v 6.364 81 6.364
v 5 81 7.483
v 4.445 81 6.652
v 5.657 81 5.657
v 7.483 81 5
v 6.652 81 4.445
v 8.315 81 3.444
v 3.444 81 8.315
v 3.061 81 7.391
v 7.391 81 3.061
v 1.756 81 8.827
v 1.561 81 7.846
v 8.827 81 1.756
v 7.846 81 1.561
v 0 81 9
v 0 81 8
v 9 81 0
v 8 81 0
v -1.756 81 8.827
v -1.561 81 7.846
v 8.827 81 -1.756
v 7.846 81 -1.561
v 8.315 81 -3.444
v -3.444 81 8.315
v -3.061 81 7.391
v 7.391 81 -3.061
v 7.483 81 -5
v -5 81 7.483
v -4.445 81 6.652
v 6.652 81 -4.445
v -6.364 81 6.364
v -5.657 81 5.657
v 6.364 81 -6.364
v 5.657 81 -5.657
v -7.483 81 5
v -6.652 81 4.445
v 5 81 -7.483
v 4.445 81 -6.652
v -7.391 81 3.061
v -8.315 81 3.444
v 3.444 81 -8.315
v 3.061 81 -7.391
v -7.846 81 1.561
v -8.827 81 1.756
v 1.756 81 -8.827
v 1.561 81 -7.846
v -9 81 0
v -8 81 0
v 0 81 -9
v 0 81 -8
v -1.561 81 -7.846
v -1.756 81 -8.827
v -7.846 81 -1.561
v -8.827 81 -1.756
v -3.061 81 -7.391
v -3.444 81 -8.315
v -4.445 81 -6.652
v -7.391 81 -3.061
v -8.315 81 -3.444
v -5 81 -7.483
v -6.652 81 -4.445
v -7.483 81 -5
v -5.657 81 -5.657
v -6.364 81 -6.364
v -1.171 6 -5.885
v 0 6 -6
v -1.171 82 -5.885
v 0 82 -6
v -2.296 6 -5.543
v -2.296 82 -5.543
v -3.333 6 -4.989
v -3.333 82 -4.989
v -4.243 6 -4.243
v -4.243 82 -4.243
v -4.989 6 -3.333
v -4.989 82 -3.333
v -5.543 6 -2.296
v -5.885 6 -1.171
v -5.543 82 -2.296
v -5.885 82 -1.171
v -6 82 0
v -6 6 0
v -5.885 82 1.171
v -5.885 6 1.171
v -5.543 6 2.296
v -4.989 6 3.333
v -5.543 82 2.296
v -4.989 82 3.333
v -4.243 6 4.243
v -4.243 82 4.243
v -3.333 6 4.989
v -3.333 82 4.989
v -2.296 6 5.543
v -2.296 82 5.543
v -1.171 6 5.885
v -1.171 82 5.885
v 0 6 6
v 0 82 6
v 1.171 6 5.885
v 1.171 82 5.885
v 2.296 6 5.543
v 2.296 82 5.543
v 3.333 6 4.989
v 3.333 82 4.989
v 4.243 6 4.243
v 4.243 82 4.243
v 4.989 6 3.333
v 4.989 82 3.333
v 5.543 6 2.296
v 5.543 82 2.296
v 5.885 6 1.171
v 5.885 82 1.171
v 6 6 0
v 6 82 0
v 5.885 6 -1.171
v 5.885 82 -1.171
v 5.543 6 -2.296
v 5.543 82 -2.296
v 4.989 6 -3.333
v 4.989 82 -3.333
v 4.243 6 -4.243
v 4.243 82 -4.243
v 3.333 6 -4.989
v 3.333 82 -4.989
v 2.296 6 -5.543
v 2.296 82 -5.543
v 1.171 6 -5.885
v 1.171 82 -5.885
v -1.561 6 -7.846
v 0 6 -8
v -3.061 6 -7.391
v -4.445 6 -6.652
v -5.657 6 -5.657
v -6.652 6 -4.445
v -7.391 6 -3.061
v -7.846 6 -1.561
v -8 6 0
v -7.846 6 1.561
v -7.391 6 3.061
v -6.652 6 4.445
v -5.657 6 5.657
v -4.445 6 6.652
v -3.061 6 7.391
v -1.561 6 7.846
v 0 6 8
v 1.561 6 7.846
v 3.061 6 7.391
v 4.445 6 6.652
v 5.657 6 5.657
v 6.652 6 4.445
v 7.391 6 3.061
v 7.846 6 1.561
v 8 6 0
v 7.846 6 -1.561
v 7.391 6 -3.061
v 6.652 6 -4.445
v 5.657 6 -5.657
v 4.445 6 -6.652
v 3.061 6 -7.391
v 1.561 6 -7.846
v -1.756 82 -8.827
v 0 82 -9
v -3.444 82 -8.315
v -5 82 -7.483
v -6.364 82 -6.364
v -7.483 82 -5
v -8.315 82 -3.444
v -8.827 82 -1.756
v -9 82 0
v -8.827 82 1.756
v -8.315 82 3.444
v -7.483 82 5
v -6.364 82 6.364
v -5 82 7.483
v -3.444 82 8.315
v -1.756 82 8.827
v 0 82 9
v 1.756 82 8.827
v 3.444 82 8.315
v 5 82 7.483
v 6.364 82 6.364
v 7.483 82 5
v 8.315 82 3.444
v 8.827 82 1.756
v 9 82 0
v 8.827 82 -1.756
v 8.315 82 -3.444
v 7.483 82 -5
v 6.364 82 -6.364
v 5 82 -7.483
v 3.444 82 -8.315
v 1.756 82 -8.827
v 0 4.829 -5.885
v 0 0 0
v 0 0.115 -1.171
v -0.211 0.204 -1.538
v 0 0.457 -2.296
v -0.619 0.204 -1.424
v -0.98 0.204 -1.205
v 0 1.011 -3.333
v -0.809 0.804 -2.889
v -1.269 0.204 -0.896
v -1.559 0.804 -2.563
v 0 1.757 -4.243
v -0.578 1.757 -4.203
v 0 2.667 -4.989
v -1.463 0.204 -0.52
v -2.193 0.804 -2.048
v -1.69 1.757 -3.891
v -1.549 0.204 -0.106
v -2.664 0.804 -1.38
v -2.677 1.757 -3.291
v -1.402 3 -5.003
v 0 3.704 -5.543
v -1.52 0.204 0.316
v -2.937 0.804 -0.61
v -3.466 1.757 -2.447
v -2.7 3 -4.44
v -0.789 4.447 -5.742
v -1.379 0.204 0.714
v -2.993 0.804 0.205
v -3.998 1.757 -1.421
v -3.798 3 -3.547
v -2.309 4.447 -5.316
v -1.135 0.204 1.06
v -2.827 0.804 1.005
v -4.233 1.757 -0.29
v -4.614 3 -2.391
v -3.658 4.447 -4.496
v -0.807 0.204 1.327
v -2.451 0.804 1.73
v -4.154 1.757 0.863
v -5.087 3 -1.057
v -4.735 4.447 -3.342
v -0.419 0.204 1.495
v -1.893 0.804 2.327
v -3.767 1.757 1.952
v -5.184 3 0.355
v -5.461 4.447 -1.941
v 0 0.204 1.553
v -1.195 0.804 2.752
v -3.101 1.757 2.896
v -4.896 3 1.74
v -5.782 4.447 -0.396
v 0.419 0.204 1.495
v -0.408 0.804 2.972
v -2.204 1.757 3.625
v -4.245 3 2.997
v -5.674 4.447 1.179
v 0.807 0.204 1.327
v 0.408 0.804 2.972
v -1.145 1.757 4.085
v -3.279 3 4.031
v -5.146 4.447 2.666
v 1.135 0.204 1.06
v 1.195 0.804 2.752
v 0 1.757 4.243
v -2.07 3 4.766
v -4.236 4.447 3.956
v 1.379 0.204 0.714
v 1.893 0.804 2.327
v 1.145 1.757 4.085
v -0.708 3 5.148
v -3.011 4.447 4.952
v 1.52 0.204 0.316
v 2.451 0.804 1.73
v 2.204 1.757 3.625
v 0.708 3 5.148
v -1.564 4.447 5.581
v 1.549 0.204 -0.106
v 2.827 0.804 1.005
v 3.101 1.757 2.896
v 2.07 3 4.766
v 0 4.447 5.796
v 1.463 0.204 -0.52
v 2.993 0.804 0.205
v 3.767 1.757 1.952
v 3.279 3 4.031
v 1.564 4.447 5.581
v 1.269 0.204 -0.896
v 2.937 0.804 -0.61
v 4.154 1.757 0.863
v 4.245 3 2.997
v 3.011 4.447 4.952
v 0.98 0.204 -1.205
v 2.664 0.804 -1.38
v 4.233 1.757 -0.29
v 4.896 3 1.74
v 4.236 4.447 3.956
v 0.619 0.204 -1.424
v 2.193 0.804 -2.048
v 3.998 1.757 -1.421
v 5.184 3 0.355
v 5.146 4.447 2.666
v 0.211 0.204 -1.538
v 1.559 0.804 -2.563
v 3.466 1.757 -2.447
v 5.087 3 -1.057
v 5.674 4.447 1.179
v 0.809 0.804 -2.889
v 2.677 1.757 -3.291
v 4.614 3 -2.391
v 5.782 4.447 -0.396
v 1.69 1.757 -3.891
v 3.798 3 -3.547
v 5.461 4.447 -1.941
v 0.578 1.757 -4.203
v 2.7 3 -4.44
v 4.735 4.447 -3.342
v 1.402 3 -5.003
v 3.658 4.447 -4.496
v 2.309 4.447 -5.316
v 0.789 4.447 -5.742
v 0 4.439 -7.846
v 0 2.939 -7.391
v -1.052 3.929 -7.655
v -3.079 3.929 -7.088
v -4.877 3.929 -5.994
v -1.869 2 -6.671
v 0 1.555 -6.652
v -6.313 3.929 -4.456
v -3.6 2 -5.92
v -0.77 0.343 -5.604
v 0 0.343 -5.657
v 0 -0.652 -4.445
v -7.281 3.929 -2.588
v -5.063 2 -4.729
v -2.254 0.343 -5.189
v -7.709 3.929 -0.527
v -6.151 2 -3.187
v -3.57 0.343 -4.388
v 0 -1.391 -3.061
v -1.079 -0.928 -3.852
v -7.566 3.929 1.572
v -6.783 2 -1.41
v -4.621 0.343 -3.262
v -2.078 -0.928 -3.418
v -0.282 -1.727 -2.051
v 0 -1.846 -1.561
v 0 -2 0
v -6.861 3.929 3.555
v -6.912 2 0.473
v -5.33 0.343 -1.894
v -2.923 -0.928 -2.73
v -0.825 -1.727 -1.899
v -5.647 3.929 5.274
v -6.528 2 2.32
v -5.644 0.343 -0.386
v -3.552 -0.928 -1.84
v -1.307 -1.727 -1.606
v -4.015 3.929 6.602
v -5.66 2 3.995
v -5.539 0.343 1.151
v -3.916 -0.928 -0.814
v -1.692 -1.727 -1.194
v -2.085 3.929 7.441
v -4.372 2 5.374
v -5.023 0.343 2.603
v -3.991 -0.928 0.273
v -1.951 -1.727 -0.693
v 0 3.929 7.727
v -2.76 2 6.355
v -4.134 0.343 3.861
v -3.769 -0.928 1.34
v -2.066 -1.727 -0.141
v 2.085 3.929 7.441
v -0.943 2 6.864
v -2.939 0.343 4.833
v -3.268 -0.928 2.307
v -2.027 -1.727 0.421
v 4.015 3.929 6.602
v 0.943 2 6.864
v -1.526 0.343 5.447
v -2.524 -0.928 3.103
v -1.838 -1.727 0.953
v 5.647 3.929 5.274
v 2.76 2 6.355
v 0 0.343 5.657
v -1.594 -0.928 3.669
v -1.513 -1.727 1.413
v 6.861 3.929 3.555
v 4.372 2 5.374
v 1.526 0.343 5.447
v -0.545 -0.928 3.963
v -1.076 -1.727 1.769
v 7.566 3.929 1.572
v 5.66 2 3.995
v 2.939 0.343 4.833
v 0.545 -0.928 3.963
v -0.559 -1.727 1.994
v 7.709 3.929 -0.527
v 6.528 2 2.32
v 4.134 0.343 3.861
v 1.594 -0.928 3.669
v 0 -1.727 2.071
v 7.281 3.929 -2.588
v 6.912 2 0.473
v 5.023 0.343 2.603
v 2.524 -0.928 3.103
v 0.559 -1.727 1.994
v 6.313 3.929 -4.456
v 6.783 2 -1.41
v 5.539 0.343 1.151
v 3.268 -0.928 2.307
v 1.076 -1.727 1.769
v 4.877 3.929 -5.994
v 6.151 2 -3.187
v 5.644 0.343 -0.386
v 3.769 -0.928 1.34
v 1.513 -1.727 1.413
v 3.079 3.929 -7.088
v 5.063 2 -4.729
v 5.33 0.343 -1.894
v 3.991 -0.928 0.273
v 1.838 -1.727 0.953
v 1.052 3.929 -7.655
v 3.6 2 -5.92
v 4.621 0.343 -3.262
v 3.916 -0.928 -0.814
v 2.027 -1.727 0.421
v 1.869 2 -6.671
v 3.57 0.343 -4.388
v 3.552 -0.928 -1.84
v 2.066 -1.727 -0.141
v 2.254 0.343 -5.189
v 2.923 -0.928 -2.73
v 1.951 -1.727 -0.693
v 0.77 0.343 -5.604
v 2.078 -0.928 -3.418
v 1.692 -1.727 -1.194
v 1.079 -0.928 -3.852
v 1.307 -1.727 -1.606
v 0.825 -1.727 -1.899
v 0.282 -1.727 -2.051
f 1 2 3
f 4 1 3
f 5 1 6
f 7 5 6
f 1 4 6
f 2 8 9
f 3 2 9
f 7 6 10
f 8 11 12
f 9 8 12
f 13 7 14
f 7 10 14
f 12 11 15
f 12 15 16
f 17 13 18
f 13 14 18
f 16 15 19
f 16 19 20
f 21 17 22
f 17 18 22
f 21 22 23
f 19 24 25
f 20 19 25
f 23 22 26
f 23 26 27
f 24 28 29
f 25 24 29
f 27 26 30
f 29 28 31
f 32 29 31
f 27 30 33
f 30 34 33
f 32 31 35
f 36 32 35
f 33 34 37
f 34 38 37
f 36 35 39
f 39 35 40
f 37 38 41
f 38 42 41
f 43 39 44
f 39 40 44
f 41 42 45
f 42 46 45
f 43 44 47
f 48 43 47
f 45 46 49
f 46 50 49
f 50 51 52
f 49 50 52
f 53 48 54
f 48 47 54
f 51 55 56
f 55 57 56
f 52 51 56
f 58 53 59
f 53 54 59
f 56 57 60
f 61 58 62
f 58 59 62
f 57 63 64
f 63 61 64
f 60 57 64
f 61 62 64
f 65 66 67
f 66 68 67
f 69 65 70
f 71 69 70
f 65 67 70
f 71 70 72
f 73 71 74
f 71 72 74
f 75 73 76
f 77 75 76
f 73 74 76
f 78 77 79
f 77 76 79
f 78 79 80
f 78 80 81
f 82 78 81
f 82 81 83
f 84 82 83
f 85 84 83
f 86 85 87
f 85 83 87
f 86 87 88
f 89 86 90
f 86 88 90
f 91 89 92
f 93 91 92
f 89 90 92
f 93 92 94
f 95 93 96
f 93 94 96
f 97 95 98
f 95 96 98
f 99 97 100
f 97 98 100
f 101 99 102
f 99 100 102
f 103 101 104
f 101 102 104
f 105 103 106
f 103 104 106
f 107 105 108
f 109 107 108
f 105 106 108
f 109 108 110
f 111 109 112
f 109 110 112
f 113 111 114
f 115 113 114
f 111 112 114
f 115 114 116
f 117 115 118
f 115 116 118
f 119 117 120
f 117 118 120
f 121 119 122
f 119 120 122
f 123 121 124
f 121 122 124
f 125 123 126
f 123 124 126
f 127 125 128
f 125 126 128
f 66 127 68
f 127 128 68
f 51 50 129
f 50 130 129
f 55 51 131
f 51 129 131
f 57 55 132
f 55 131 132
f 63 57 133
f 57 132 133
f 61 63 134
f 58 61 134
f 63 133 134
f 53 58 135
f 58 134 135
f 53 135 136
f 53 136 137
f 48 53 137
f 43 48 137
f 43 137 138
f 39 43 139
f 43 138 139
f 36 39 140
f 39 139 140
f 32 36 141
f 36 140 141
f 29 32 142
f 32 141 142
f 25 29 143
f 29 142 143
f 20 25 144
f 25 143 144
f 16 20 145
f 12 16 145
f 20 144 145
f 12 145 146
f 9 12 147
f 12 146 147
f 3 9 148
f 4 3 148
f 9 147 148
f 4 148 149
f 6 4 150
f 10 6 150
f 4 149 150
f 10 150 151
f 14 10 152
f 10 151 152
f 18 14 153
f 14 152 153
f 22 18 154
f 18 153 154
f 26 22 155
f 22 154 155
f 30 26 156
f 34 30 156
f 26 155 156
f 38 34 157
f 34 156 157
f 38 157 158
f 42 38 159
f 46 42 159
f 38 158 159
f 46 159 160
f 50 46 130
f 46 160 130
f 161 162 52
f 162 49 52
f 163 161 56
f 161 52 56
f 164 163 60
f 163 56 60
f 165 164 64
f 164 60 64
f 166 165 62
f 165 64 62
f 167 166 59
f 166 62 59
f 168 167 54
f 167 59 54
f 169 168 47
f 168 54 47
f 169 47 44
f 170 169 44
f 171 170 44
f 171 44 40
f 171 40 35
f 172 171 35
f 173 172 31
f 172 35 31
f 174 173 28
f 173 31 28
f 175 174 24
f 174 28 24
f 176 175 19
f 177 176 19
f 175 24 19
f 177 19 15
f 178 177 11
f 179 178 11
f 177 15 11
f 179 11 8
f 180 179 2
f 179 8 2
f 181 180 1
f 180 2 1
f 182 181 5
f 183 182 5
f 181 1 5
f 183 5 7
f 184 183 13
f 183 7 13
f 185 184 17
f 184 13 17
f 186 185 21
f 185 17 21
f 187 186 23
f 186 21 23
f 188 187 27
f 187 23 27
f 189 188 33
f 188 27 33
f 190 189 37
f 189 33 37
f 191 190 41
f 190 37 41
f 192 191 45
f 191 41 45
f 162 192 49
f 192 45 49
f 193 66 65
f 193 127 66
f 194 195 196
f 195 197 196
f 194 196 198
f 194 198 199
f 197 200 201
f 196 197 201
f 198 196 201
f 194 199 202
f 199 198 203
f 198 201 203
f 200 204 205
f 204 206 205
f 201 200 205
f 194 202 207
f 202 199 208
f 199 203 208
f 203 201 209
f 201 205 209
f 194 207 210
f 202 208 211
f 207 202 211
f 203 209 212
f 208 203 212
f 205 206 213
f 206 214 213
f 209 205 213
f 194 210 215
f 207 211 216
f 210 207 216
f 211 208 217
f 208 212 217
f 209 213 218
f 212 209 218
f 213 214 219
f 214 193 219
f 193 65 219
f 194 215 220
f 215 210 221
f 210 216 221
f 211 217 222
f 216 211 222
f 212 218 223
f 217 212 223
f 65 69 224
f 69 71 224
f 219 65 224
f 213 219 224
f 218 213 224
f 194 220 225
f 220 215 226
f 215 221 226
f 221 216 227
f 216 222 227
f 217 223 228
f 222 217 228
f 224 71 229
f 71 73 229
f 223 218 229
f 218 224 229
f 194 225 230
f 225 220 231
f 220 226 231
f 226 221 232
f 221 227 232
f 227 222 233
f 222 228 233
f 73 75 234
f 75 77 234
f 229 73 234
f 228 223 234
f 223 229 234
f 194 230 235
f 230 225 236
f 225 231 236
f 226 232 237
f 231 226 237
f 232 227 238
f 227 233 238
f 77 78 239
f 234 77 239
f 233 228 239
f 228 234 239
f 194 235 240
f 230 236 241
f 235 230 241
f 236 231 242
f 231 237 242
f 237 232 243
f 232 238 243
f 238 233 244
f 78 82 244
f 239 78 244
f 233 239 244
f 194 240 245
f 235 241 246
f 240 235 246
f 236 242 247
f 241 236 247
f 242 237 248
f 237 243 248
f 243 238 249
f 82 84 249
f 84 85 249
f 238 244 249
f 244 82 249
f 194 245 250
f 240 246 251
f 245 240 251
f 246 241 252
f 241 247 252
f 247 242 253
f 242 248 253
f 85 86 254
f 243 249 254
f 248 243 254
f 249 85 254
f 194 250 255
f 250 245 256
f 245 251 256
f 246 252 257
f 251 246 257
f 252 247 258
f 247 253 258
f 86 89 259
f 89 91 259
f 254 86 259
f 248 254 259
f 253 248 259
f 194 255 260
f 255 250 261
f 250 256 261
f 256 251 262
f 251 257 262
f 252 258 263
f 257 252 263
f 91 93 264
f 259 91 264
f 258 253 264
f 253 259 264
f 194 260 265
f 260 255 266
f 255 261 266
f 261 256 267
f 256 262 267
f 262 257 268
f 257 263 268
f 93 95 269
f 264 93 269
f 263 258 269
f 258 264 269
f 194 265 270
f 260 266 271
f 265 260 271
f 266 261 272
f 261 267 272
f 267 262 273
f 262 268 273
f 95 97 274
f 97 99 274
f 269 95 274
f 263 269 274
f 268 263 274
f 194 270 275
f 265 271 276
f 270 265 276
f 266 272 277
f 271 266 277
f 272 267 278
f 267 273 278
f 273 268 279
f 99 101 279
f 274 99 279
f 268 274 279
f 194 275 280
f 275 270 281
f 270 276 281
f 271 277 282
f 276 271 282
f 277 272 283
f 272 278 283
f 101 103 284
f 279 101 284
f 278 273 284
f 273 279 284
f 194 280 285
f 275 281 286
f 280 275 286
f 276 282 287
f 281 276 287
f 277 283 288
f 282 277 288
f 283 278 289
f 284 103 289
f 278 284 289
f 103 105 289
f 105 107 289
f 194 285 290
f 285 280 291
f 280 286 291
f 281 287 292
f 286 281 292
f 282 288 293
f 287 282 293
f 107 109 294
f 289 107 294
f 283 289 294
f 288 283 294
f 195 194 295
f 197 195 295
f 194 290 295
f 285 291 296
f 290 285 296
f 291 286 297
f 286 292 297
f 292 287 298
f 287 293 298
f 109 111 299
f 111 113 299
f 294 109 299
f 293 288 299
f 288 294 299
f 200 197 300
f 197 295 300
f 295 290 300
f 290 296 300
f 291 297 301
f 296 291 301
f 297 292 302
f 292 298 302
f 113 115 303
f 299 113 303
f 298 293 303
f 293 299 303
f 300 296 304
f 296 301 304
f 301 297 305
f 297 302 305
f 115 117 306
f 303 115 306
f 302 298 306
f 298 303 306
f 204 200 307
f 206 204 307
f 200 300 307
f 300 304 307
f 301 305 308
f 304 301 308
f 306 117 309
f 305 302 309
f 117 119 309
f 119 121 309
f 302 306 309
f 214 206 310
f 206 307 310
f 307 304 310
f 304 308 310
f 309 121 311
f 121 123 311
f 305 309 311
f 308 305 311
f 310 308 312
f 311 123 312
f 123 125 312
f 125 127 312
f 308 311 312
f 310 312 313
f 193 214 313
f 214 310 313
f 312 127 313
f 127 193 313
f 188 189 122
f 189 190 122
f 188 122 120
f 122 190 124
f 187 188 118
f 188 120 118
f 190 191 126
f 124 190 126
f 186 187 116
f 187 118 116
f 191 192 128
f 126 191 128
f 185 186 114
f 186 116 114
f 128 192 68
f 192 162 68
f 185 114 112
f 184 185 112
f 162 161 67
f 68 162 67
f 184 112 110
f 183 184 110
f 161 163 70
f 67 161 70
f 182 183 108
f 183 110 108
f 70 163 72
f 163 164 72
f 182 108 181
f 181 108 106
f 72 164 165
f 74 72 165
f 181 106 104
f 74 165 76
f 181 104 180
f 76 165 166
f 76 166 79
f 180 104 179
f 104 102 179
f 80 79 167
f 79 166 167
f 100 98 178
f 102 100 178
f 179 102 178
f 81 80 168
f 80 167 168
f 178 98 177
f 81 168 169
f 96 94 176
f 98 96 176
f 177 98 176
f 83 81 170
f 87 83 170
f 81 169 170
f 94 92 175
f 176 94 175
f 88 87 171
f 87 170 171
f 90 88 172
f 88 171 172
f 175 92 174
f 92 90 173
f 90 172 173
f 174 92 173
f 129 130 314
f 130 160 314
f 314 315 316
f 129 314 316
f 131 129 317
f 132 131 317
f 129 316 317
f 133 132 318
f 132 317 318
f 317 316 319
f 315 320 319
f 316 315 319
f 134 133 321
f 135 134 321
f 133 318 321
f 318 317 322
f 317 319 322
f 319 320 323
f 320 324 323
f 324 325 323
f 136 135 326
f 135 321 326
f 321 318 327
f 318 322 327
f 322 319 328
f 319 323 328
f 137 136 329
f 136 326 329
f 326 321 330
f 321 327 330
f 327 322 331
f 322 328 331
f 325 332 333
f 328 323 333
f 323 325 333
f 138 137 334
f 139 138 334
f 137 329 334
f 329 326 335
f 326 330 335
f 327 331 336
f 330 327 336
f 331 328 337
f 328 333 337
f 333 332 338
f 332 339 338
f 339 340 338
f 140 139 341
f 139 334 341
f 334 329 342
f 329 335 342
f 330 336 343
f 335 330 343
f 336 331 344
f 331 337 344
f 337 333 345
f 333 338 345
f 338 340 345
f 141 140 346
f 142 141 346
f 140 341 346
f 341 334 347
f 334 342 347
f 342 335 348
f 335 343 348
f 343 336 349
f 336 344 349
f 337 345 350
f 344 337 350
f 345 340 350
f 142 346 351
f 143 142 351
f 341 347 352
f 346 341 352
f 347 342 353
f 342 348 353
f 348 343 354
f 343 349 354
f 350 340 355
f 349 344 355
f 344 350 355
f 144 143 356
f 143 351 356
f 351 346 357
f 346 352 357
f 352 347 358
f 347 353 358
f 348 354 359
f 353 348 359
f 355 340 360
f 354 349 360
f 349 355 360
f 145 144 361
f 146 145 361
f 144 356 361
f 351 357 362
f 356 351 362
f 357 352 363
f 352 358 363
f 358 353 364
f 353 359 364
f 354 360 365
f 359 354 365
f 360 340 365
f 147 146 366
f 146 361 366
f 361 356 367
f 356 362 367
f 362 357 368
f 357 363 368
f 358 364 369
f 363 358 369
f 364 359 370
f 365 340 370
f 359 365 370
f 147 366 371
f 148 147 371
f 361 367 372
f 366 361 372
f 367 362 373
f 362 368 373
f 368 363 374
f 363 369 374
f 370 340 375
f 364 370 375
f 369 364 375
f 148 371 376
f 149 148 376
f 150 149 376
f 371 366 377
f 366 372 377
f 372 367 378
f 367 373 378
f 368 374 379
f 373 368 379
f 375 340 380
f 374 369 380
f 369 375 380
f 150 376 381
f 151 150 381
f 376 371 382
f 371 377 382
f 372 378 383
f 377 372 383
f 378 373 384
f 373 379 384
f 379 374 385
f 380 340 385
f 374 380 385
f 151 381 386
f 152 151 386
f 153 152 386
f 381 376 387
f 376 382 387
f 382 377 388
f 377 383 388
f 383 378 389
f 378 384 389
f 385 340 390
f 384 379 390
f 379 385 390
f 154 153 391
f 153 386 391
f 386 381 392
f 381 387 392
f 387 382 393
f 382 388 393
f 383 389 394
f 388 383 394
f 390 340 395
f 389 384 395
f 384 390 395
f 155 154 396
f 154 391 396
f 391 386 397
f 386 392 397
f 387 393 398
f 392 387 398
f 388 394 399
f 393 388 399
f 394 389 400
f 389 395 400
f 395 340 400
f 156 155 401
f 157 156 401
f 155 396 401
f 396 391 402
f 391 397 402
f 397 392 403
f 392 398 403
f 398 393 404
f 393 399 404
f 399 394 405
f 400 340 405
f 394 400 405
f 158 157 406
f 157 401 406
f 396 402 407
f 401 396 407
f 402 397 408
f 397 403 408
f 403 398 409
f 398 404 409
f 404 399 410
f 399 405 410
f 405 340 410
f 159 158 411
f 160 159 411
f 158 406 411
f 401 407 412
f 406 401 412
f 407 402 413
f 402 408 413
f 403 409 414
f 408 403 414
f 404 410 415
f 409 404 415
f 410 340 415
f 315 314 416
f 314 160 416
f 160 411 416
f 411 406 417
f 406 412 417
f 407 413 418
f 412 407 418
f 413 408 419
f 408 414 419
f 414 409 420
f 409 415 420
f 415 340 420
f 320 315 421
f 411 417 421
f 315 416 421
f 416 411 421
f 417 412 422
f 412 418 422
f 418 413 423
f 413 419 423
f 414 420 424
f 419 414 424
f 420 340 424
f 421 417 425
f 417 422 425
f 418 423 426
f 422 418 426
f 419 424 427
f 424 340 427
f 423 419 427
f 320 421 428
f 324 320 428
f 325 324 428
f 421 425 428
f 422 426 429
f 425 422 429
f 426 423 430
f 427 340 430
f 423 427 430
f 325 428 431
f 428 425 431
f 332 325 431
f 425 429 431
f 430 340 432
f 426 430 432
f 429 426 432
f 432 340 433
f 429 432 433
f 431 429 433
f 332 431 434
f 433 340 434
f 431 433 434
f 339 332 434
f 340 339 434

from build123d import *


with BuildPart() as part:
    # Sketch2 → Revolve1 (revolve)
    with BuildSketch(Plane.XY, mode=Mode.PRIVATE) as revolve1_sk:
        with BuildLine():
            Line((-6, 6), (-6, 81))
            Line((-6, 81), (-6, 82))
            Line((-6, 82), (-9, 82))
            Line((-9, 82), (-9, 81))
            Line((-9, 81), (-8, 81))
            Line((-8, 81), (-8, 6))
            ThreePointArc((-8, 6), (-5.656854249, 0.343145751), (0, -2))
            Line((0, -2), (0, 0))
            ThreePointArc((0, 0), (-4.242640687, 1.757359313), (-6, 6))
        make_face()
    revolve(revolve1_sk.sketch.rotate(Axis((0, 0, 0), (0, 1, 0)), 270), axis=Axis((0, 0, 0), (0, 1, 0)))


solid = part.part
